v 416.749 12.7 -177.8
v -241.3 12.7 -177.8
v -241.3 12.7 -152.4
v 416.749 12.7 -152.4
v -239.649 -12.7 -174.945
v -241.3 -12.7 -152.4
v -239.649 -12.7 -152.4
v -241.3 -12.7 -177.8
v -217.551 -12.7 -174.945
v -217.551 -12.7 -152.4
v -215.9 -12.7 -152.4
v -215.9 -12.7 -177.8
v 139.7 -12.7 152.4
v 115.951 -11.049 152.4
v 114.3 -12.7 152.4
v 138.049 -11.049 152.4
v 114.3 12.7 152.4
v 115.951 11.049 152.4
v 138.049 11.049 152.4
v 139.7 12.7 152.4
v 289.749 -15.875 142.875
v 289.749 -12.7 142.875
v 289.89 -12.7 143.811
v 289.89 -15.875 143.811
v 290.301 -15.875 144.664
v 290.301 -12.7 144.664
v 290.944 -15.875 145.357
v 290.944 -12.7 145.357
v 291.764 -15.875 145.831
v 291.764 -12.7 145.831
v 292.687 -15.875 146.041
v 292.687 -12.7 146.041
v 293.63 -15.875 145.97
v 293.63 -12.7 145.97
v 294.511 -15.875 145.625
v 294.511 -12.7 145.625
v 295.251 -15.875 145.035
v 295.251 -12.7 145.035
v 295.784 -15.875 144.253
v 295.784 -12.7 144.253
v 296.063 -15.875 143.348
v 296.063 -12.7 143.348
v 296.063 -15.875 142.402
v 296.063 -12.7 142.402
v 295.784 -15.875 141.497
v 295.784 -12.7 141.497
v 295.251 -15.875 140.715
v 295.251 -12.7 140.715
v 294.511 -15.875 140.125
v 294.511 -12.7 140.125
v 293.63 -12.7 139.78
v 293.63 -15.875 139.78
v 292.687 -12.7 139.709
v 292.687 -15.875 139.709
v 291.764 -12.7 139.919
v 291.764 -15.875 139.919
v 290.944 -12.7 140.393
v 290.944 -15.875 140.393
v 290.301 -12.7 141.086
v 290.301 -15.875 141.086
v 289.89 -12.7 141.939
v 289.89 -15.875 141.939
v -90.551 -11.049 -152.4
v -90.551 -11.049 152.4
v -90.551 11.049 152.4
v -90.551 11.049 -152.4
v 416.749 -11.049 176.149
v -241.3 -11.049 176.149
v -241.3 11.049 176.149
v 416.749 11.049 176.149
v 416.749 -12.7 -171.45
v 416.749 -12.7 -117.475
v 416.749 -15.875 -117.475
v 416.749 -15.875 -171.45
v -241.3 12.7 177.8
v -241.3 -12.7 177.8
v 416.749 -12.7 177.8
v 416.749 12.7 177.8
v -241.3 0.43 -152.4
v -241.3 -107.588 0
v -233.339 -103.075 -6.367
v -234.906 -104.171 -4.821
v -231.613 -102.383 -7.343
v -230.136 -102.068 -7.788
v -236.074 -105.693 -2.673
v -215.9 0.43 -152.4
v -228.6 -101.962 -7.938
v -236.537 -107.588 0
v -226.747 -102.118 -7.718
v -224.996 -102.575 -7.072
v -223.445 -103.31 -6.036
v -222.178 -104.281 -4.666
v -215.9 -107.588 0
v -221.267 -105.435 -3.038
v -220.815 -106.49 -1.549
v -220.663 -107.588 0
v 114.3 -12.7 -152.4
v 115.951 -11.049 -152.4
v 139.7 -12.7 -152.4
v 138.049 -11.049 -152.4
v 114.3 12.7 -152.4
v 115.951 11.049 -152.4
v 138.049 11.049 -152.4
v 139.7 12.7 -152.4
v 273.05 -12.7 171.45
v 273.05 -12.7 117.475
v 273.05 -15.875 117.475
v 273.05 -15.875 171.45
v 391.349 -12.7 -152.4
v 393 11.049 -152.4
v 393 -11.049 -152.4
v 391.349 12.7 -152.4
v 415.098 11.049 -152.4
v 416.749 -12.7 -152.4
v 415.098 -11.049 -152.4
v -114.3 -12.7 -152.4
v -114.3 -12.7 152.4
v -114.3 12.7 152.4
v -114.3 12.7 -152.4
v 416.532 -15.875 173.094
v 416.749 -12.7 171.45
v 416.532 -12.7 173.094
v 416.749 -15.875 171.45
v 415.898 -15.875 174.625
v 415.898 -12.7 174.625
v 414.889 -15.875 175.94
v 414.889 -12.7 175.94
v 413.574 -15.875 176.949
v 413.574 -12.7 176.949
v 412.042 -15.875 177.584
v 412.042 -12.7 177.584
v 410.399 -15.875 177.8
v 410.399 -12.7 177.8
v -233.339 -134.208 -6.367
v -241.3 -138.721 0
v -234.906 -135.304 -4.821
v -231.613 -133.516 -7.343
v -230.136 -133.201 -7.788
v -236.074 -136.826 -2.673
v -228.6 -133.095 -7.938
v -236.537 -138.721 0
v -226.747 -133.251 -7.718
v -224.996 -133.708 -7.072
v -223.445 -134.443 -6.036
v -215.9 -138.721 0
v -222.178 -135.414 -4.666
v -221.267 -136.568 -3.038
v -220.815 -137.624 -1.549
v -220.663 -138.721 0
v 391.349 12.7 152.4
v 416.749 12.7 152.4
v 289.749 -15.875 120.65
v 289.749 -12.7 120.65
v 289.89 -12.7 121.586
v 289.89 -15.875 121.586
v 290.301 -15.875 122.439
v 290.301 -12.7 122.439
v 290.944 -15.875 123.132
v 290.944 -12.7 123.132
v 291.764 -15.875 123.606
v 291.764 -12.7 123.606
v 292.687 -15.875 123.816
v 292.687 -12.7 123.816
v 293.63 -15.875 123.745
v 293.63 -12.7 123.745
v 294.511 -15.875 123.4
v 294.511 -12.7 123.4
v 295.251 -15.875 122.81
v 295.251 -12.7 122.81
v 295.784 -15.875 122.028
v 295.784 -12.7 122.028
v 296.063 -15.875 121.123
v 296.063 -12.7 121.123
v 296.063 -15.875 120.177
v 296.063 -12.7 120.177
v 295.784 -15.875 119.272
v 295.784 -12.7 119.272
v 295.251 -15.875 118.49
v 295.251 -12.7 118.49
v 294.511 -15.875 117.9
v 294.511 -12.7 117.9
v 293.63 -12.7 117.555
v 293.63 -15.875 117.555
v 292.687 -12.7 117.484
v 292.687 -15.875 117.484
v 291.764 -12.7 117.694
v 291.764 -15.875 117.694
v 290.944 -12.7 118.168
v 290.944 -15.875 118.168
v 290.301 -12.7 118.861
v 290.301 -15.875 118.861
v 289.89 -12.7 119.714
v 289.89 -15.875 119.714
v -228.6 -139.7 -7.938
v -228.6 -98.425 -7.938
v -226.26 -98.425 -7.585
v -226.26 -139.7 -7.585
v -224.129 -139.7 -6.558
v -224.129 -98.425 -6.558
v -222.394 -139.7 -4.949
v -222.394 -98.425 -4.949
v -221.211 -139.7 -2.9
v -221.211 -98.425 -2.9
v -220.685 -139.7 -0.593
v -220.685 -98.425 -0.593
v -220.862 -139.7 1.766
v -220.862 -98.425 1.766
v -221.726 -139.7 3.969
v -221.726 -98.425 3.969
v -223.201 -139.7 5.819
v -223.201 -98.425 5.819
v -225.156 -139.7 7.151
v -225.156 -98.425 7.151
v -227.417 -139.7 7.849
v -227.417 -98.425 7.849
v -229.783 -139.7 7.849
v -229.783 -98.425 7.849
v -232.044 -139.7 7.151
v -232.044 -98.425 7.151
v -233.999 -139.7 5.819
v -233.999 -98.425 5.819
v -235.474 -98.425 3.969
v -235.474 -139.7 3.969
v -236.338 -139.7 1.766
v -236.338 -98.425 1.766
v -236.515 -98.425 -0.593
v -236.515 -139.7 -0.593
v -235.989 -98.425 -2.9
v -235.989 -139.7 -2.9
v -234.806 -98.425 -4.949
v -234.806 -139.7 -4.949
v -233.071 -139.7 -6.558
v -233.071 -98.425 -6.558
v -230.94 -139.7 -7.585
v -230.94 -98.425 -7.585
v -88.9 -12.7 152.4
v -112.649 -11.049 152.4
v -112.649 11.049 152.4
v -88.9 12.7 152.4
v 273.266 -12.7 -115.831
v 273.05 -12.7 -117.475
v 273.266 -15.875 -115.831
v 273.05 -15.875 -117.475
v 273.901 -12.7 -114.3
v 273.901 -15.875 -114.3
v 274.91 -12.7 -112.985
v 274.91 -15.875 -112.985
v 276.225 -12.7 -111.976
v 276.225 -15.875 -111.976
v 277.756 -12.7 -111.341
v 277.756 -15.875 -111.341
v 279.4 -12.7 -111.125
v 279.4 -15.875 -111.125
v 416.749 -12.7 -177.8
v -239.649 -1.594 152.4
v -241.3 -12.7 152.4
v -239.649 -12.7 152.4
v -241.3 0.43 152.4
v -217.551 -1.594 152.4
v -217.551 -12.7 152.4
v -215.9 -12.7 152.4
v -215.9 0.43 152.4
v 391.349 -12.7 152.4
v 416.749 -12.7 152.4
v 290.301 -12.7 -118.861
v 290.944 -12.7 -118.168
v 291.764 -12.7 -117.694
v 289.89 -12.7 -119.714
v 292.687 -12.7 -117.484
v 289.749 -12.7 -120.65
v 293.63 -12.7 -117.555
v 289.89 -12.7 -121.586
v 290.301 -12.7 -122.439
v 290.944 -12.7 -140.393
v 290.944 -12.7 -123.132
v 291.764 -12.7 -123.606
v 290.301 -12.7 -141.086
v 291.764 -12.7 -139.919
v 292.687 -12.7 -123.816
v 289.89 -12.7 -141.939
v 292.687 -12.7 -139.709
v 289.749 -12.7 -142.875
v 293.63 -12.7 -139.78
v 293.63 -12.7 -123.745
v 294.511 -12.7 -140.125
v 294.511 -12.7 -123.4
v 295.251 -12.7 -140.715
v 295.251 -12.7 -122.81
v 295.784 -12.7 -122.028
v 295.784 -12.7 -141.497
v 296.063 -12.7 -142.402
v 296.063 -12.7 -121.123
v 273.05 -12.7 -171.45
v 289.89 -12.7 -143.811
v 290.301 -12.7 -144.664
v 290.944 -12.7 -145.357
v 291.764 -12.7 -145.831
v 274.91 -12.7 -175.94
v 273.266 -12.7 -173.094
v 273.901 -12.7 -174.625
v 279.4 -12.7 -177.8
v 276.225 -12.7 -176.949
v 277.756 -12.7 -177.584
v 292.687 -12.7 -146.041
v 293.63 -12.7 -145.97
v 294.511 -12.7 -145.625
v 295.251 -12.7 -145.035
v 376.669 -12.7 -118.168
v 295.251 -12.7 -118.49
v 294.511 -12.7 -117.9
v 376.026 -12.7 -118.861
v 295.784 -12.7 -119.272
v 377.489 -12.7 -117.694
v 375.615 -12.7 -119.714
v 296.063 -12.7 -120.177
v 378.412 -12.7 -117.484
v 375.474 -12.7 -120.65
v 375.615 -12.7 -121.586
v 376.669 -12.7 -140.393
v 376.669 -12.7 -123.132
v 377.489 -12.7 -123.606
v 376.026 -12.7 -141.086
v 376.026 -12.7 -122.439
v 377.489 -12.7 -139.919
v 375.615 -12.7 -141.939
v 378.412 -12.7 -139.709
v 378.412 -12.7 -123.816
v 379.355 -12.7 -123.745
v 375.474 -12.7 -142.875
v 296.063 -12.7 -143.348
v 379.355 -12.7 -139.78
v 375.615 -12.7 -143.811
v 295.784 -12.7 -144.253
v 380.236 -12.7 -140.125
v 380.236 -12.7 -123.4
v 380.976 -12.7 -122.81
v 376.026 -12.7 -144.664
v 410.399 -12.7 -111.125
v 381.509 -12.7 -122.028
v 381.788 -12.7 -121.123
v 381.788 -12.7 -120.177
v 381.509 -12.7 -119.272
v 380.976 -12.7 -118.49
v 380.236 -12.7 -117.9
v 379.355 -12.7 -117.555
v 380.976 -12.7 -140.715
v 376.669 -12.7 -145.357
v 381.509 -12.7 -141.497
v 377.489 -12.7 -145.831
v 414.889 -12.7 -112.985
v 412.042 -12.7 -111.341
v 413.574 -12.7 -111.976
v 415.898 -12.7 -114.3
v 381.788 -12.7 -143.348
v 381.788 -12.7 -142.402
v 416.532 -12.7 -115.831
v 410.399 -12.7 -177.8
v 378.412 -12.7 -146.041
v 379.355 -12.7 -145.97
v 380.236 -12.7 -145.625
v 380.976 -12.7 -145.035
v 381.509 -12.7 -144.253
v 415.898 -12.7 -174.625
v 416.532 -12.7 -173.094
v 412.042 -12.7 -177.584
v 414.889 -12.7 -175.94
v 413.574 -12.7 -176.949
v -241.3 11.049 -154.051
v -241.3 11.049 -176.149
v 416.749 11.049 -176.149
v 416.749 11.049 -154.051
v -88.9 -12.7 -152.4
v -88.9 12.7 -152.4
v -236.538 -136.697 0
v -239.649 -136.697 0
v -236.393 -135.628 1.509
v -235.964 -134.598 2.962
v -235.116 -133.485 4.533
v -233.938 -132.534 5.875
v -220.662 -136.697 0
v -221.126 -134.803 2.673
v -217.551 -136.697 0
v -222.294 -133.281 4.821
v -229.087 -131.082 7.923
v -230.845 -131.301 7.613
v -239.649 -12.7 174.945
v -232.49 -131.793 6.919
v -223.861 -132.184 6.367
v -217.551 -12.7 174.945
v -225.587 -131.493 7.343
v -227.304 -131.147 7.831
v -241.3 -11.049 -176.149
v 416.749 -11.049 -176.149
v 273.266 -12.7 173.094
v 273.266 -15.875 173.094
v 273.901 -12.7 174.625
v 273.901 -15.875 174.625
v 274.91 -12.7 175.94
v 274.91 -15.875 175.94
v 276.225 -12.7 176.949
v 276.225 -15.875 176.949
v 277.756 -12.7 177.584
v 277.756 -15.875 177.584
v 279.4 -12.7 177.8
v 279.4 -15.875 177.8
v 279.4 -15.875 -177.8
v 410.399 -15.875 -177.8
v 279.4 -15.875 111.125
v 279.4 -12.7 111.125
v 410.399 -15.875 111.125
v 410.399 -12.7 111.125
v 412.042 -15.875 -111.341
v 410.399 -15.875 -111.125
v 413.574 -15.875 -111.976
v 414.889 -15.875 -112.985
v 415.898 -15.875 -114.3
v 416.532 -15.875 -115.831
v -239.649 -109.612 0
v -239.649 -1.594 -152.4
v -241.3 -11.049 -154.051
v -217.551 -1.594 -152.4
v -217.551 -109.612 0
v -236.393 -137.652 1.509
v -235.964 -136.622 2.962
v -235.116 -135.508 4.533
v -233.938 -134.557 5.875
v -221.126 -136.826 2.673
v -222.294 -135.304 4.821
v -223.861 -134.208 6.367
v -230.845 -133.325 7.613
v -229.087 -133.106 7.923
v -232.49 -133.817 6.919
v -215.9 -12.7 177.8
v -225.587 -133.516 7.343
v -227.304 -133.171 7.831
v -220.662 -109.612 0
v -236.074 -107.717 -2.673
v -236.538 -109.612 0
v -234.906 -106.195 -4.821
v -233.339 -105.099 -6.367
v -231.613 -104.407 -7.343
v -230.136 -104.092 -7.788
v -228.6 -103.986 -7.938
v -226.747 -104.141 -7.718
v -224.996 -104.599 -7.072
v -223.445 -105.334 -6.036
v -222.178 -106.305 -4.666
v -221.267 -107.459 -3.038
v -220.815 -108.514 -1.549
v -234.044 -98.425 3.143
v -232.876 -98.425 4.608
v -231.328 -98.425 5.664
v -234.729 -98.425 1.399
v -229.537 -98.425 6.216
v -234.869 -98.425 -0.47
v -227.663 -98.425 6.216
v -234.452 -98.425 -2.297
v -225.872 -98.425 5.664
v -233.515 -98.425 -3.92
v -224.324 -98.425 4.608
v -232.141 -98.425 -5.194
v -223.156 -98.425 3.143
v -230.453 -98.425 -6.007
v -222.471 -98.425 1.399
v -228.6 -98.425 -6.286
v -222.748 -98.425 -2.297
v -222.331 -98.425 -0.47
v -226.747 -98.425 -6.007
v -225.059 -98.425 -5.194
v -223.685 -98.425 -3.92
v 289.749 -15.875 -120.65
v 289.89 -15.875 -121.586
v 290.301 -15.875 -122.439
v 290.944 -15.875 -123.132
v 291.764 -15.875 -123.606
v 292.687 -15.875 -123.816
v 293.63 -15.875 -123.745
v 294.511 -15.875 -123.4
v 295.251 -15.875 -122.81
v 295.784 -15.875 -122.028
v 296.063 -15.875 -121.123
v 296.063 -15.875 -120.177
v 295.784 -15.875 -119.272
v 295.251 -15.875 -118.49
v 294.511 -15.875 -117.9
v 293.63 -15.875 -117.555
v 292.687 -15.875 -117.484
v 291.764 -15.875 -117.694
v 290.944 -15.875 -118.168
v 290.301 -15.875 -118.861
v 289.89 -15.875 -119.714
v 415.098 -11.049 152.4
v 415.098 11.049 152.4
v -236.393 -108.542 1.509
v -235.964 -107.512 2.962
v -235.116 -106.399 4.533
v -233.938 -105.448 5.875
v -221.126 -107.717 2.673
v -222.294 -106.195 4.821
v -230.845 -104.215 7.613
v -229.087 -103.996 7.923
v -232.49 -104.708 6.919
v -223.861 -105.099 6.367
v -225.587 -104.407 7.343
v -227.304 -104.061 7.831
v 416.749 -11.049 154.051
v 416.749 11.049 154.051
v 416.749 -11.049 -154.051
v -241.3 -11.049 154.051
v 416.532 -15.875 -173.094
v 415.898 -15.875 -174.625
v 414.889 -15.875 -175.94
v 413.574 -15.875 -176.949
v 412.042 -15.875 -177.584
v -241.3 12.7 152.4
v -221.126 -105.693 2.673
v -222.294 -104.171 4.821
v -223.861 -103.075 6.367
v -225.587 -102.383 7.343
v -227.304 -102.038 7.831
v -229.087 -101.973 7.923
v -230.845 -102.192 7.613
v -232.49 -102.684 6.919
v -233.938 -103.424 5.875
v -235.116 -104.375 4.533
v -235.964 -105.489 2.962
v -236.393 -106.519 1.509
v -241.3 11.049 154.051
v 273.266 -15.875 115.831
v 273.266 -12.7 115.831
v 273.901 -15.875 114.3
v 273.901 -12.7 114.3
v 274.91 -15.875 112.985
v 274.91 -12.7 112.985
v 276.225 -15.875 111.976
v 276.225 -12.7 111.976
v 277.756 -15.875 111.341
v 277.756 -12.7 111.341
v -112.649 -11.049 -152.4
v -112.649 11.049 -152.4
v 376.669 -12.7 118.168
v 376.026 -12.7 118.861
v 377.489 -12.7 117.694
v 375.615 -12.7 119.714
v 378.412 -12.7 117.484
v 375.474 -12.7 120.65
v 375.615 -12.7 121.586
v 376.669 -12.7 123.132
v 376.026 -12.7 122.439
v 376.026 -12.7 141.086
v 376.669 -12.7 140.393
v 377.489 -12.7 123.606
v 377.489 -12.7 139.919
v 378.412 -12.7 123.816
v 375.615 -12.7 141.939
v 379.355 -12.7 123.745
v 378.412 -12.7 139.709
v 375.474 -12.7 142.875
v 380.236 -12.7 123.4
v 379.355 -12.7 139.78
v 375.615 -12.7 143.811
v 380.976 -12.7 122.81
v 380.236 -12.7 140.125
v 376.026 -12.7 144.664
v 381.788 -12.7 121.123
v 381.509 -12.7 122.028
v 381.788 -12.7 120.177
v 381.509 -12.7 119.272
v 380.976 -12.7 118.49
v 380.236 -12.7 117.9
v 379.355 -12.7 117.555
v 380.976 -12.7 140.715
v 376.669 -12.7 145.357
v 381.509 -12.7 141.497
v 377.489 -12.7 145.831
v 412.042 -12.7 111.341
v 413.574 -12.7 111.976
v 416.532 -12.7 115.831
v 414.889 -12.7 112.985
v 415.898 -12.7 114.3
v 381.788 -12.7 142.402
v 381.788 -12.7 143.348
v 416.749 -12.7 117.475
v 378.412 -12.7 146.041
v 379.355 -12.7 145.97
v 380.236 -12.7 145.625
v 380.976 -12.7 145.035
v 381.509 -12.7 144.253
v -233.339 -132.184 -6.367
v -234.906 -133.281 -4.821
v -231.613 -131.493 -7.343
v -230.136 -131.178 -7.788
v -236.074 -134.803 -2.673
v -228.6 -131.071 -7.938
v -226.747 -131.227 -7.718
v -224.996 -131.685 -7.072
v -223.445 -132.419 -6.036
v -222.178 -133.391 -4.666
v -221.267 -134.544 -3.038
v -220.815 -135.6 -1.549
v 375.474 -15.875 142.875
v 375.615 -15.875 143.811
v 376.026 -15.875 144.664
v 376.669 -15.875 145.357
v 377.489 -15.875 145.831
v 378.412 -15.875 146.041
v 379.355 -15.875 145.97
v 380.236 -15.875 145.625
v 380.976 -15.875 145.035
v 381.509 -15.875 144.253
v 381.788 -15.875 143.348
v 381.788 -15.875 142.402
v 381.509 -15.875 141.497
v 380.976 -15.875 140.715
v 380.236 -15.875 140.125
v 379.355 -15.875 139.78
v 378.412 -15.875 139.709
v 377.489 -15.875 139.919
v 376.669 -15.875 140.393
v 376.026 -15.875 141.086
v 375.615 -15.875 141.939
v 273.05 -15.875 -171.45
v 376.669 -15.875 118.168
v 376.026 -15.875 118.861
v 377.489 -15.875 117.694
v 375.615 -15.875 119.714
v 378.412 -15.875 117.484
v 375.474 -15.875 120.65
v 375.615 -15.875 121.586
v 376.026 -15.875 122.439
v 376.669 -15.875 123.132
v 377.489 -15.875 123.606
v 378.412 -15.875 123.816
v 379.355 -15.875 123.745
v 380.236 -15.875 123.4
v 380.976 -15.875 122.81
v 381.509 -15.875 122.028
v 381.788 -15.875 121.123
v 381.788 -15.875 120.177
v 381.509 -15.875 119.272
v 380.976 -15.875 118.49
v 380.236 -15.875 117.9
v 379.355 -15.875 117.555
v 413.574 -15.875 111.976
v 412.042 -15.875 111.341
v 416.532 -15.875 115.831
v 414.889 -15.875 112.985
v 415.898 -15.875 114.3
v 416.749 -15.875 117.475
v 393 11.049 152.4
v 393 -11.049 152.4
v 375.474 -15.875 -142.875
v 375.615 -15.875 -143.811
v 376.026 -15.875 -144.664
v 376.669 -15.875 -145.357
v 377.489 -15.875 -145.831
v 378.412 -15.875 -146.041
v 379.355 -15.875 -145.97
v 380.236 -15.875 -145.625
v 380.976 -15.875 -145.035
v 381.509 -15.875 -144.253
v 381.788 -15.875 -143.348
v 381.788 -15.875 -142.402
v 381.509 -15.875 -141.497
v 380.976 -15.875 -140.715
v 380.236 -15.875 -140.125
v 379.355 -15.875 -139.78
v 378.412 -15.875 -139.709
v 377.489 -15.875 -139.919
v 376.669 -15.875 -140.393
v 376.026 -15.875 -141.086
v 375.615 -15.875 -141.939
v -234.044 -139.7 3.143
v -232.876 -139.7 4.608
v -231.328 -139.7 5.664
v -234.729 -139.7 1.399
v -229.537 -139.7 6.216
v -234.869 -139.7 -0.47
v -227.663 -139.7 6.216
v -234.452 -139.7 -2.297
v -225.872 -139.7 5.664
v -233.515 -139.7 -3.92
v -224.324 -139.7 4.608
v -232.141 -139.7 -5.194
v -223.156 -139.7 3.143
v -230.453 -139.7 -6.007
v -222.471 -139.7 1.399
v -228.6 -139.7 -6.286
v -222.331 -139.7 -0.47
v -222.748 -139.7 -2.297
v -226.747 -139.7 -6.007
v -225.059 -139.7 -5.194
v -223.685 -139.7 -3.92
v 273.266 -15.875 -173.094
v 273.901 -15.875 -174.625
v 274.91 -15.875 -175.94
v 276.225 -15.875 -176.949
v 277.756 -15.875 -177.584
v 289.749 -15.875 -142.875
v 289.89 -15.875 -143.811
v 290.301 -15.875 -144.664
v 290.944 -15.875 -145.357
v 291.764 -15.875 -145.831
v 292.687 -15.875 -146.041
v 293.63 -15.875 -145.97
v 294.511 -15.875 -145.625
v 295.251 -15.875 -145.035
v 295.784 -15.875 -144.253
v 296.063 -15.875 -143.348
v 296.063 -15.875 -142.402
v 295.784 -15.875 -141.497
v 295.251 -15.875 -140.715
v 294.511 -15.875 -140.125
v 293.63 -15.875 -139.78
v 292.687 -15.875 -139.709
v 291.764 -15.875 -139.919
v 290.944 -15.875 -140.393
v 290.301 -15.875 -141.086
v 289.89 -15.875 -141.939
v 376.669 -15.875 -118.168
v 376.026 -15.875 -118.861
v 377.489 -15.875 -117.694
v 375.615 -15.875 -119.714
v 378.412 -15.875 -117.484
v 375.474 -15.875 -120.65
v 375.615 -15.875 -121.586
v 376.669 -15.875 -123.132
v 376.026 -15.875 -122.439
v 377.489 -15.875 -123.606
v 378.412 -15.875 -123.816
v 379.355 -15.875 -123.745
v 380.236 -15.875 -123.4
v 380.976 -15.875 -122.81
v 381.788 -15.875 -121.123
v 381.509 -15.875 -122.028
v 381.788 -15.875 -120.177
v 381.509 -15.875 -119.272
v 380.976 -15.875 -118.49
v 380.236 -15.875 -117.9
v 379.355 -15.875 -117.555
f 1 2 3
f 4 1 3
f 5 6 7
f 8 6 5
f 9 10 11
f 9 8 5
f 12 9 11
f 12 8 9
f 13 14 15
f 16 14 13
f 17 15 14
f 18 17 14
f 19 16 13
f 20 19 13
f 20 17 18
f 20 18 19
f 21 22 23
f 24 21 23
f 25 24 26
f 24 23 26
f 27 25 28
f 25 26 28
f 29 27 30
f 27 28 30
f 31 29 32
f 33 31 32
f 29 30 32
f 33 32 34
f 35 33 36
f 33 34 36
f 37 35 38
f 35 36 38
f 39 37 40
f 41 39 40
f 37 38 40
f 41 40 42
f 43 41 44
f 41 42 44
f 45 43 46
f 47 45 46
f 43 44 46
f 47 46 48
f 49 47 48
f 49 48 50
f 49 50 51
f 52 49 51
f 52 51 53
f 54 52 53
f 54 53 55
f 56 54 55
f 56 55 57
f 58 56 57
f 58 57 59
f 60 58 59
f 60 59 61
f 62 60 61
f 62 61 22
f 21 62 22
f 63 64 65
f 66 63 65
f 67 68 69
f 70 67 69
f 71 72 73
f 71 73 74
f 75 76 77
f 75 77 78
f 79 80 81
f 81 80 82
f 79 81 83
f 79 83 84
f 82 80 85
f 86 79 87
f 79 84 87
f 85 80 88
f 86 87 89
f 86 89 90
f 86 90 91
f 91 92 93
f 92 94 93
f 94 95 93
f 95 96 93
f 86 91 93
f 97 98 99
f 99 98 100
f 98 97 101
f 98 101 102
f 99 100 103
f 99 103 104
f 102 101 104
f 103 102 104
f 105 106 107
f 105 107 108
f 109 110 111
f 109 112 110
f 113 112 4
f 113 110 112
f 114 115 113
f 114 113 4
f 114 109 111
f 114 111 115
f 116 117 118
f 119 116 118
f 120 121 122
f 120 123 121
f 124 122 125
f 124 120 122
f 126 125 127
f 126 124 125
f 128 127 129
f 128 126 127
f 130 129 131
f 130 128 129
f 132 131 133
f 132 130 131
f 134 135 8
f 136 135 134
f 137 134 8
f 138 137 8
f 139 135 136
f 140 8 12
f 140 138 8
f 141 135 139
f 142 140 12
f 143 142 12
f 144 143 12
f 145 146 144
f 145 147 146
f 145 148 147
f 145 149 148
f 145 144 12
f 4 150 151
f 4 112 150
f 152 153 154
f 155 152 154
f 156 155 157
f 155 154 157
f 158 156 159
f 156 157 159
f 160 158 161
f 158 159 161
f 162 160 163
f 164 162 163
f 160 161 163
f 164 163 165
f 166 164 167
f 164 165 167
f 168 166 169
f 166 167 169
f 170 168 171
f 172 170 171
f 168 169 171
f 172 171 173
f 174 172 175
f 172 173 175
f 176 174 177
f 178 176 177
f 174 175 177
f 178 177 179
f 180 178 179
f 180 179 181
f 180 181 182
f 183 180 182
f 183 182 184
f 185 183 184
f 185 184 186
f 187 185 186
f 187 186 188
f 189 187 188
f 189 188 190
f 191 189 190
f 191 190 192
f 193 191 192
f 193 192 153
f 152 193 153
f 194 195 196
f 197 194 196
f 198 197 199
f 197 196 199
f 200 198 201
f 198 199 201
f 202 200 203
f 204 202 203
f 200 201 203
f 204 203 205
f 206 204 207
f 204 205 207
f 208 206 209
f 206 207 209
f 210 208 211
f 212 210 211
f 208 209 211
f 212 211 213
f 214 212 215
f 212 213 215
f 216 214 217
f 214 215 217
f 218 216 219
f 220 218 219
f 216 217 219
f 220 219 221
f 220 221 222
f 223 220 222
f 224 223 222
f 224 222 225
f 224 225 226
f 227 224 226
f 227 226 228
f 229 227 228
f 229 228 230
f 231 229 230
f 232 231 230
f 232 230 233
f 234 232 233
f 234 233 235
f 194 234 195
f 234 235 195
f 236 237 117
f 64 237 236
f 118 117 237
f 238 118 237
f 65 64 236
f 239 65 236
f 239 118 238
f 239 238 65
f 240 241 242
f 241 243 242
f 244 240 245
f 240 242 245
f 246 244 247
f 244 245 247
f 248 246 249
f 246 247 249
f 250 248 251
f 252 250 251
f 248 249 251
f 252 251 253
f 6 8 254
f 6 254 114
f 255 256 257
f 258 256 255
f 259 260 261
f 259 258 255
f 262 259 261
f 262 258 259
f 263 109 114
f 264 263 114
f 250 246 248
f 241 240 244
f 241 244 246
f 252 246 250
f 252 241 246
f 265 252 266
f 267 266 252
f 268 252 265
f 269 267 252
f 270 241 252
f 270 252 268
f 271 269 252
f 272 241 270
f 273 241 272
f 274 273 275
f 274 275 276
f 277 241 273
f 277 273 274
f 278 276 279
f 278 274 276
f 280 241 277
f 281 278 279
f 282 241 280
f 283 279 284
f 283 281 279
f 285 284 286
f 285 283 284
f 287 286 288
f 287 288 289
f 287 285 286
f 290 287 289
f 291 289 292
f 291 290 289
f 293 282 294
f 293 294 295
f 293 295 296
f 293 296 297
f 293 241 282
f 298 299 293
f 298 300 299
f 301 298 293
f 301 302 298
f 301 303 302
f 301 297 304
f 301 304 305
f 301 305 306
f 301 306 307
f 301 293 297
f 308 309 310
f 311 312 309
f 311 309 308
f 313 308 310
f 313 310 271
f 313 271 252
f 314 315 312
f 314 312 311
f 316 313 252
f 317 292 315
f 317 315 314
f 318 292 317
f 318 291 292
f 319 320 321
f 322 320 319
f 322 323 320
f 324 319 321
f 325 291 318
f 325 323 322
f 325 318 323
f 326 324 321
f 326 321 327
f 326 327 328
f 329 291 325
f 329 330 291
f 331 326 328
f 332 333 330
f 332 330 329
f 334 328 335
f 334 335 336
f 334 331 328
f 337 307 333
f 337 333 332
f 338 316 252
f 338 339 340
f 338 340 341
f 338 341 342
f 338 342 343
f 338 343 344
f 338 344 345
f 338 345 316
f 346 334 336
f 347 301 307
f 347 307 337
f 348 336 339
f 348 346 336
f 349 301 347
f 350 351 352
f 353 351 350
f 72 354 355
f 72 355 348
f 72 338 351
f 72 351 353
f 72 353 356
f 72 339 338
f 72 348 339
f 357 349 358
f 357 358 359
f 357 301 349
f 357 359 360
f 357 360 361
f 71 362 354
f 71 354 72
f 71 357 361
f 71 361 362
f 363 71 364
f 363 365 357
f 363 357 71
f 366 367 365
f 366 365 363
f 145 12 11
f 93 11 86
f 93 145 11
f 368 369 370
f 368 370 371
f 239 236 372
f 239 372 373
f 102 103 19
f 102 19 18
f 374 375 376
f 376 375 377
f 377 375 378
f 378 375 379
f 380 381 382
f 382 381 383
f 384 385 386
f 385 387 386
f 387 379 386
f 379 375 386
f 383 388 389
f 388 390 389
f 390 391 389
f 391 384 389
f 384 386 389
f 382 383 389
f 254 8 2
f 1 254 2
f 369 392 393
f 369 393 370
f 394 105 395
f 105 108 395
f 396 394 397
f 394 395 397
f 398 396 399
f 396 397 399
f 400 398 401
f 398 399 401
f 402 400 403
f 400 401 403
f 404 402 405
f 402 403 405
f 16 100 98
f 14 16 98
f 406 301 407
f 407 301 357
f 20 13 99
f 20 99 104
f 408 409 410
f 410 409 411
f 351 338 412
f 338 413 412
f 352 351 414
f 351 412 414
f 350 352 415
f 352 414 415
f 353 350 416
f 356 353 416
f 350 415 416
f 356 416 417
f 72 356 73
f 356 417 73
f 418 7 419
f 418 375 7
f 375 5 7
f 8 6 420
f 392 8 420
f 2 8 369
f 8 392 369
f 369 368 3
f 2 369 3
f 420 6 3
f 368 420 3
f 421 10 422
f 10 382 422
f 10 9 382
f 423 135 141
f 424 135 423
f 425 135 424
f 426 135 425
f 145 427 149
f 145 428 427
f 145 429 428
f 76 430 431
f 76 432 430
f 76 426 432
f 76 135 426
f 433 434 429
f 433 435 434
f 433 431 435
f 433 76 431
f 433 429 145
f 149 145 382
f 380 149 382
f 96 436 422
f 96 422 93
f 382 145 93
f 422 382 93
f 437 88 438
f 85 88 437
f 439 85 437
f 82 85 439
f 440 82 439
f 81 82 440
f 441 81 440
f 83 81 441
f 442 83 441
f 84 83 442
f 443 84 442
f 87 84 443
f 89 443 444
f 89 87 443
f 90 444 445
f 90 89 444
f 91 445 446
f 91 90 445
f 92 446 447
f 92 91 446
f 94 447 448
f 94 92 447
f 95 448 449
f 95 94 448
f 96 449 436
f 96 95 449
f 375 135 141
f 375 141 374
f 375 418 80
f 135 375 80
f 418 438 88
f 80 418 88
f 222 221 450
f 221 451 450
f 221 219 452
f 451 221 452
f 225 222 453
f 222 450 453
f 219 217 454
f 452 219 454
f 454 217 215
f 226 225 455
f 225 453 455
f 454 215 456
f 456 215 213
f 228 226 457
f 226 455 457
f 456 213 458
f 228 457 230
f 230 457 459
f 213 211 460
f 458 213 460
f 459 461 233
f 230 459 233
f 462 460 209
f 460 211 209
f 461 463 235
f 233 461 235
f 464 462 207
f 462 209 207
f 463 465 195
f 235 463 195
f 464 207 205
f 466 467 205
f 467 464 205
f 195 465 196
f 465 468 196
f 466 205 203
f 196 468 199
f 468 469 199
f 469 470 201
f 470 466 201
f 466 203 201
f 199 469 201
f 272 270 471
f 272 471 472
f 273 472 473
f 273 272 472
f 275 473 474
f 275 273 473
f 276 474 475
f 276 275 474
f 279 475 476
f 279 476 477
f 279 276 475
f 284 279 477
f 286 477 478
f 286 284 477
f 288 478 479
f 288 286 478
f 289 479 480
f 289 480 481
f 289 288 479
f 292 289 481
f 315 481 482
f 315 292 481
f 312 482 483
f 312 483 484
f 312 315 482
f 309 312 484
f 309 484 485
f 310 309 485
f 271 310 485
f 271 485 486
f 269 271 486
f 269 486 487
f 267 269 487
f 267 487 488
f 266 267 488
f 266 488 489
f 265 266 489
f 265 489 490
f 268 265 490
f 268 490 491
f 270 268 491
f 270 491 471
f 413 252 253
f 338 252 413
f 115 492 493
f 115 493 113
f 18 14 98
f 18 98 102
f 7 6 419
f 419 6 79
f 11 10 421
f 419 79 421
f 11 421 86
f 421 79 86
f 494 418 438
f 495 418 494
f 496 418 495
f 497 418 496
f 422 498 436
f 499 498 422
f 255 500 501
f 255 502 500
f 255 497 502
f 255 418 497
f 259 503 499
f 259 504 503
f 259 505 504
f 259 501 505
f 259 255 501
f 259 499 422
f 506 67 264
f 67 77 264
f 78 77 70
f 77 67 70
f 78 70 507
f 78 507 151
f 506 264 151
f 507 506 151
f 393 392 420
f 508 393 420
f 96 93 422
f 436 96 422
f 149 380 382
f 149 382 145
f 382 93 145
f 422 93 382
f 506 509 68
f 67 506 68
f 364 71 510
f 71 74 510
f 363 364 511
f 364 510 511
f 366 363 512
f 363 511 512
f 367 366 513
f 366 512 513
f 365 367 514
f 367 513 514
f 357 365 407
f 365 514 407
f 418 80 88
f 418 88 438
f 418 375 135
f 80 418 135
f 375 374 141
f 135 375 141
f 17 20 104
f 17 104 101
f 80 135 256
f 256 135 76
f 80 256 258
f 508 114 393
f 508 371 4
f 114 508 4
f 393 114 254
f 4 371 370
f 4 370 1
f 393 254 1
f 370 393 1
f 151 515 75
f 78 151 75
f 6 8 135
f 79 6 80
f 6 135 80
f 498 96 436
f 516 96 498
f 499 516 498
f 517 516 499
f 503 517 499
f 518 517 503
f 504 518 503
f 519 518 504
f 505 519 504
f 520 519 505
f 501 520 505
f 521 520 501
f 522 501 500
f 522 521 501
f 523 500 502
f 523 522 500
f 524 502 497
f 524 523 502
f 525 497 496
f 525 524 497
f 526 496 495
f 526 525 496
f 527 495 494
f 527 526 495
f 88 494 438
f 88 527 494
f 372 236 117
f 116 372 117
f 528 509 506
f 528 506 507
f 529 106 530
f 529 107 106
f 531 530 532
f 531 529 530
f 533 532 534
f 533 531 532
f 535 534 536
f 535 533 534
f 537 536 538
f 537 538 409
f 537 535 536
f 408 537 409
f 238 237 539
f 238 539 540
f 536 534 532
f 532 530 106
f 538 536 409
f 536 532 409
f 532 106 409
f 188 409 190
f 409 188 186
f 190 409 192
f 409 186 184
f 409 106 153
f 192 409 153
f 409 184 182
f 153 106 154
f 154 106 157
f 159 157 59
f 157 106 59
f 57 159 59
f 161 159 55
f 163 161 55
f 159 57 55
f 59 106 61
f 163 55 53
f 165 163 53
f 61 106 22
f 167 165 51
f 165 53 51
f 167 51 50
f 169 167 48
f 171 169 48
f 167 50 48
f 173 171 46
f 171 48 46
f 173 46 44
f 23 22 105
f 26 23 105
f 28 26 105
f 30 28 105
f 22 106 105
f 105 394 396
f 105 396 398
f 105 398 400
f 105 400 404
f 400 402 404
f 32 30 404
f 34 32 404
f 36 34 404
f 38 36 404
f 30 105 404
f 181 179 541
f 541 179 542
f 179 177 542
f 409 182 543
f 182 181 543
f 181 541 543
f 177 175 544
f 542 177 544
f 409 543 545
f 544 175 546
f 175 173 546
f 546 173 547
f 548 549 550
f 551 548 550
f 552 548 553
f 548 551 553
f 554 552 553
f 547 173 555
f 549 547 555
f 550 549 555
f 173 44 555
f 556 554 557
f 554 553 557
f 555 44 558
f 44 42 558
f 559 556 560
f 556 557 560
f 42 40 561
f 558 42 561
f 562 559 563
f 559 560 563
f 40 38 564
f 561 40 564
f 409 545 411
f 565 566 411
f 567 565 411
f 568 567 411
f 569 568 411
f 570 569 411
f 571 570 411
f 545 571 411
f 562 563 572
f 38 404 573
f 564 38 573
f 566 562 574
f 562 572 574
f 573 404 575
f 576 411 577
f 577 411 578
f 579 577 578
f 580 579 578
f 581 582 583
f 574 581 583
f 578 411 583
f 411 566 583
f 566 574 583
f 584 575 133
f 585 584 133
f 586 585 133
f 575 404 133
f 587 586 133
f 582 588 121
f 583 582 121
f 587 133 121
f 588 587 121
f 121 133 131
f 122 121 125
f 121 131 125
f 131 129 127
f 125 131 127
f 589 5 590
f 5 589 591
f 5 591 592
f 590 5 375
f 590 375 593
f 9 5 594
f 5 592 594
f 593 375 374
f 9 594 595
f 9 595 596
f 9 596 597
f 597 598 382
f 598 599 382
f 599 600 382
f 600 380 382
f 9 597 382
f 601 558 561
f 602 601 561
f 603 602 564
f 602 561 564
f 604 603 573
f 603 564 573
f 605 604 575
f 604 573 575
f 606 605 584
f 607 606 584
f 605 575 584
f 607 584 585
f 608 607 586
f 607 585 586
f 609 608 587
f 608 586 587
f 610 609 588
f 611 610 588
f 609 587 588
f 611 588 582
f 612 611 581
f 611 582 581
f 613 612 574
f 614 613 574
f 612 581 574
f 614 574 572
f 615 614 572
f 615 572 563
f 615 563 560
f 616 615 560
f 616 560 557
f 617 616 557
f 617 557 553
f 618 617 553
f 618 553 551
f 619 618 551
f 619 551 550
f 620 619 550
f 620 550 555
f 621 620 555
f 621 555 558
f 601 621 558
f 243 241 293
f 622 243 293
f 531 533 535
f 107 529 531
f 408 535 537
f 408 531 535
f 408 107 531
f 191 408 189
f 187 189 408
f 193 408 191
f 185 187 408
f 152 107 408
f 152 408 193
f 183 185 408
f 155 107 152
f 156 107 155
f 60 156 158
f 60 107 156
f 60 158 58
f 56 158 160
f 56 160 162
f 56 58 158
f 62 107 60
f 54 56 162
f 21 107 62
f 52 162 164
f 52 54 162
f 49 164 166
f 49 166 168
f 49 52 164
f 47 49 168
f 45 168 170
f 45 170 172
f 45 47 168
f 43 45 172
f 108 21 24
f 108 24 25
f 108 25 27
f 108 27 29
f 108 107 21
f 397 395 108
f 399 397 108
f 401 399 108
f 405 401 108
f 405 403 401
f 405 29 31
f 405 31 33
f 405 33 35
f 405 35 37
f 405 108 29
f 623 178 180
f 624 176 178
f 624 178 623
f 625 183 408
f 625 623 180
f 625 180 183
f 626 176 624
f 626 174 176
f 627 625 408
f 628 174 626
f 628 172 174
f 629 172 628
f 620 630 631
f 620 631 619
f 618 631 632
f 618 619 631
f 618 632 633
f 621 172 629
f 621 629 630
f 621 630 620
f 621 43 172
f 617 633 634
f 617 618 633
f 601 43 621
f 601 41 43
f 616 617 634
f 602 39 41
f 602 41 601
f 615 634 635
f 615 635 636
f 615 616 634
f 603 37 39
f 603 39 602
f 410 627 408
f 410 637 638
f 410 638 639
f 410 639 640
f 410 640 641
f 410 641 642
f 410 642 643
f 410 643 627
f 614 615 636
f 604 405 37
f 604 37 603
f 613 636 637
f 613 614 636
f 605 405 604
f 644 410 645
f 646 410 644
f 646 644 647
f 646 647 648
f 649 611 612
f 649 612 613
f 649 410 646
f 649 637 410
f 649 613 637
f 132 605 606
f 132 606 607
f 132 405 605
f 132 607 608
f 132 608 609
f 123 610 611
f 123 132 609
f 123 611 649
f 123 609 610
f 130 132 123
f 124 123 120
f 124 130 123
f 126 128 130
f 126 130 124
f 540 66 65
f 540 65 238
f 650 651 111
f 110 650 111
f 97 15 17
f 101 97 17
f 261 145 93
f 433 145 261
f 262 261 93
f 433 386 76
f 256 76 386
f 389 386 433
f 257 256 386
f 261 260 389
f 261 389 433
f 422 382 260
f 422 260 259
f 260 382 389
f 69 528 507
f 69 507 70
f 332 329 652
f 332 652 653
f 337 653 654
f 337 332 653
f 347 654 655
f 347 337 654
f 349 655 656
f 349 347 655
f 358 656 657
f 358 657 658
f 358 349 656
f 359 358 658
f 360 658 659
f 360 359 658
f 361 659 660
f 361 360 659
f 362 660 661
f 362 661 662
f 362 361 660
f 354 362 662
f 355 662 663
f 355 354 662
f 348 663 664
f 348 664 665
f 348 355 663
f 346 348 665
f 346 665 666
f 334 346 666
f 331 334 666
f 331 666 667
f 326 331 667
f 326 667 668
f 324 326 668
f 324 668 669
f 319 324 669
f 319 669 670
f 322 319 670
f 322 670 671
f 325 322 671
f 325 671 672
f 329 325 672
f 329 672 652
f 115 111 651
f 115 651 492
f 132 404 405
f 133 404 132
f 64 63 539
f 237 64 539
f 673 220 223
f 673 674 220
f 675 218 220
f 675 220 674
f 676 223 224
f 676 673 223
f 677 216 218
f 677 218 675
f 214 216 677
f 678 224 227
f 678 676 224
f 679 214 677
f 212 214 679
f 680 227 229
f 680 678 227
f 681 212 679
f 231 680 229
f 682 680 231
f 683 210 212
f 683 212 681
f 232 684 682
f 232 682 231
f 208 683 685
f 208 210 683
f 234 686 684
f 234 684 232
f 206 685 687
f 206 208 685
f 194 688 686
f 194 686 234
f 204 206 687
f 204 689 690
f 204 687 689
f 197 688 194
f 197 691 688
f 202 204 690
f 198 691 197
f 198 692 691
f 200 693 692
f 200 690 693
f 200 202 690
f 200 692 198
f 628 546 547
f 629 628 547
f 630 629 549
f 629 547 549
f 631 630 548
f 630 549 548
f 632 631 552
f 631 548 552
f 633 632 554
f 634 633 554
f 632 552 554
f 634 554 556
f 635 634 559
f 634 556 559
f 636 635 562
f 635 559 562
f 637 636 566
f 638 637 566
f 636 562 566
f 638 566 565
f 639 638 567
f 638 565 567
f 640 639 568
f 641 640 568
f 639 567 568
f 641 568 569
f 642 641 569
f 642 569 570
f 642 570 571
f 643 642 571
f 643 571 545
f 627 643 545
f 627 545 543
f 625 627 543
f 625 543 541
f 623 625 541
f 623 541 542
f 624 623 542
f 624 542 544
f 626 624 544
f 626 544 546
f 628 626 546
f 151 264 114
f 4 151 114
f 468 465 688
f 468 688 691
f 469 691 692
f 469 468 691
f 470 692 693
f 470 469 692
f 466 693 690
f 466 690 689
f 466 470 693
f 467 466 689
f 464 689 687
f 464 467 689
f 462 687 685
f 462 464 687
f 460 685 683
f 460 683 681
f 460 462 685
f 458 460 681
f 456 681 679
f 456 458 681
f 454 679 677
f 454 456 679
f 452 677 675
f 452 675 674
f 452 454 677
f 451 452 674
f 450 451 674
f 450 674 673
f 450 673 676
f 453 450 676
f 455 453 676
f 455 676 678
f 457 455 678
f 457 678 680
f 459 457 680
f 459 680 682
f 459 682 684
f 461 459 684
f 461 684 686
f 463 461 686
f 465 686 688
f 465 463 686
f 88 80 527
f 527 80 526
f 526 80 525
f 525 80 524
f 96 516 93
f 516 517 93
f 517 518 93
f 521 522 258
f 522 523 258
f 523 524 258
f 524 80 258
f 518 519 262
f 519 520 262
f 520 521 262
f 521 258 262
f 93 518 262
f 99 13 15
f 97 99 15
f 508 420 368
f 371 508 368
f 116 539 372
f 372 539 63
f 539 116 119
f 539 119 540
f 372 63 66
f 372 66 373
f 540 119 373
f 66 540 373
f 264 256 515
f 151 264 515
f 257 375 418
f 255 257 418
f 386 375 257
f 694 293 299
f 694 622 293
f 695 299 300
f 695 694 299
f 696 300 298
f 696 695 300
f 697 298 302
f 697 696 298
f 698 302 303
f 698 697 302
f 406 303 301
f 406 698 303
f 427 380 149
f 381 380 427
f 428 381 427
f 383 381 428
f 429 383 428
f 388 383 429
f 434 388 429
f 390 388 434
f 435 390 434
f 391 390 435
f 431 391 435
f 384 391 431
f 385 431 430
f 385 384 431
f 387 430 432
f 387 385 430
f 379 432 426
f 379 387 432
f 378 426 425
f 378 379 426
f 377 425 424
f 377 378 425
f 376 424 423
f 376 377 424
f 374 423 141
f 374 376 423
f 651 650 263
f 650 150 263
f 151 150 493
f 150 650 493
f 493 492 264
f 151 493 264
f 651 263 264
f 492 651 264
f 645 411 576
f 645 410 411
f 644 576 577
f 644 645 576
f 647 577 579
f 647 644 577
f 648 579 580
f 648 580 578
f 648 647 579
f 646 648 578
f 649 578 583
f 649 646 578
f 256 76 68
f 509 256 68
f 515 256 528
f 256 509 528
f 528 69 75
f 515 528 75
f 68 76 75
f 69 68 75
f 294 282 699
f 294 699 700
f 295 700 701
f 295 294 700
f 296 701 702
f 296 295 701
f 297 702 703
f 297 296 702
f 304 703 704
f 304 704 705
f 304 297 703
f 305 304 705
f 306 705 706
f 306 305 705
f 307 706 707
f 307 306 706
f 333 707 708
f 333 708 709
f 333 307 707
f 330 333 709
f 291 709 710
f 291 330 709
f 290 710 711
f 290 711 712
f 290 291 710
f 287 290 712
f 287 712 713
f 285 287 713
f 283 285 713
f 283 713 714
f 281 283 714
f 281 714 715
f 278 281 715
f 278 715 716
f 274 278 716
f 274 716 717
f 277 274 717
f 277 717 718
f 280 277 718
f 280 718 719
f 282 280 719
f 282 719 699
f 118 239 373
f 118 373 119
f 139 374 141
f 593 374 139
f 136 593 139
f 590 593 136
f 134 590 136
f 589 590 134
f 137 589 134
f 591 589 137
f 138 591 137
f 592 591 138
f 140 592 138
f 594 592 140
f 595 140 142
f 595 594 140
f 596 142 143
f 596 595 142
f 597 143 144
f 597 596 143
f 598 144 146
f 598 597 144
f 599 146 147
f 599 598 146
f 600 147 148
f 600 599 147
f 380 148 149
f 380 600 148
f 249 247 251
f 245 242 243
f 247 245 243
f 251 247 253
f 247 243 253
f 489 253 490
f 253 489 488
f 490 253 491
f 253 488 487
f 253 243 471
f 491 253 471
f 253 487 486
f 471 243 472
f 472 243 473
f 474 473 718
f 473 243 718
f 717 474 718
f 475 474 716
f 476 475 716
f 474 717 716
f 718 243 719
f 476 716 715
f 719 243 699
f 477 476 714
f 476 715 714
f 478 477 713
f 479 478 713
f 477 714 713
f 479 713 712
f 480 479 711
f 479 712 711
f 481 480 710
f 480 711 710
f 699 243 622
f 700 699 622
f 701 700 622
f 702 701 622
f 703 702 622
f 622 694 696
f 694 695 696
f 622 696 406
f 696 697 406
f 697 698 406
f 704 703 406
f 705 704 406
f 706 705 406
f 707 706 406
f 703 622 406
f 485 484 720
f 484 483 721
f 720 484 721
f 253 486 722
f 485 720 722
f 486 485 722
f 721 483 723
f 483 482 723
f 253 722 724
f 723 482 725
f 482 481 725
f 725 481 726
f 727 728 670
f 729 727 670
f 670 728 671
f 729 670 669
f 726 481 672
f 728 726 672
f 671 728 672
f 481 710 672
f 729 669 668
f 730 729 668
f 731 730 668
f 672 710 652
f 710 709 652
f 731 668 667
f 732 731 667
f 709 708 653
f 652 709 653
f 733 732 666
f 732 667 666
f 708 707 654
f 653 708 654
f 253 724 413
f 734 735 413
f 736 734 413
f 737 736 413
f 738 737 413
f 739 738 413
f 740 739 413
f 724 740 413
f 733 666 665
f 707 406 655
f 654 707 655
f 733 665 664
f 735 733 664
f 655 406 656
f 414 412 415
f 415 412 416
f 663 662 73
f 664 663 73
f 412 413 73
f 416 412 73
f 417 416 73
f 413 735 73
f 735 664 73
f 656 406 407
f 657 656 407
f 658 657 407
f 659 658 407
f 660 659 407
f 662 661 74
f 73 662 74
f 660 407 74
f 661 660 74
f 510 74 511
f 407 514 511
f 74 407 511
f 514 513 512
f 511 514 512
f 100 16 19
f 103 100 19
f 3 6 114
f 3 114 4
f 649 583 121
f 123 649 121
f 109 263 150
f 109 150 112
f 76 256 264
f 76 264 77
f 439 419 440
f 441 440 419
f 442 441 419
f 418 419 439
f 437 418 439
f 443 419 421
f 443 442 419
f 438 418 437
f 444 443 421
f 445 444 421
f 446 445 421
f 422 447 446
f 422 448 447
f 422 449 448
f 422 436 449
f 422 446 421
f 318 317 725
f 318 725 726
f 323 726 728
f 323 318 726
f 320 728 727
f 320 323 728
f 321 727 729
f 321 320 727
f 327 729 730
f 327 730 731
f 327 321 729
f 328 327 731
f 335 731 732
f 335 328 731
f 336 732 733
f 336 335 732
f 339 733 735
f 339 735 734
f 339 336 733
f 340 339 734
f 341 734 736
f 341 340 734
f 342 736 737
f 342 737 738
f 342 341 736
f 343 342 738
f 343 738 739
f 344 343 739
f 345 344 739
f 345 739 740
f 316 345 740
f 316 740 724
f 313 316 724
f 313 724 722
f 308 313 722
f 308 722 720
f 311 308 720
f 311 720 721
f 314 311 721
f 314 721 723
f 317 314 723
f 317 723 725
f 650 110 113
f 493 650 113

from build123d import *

# Parameters (mm, degrees)
BED_START                  = -12.7
BED_MEMBERS_OUTLINE_W      = 1.651
BED_MEMBERS_OUTLINE_H      = 304.8
BED_MEMBERS_DEPTH          = 25.4
BED_MEMBERS_2_OUTLINE_W    = 22.098
BED_MEMBERS_2_OUTLINE_H    = 304.8
BED_MEMBERS_2_DEPTH        = 1.651
BED_START_2                = 11.049
BED_MEMBERS_3_OUTLINE_W    = 22.098
BED_MEMBERS_3_OUTLINE_H    = 304.8
BED_MEMBERS_3_DEPTH        = 1.651
BED_START_3                = 152.4
BED_MEMBERS_4_OUTLINE_W    = 645.34884646
BED_MEMBERS_4_OUTLINE_H    = 1.651
BED_MEMBERS_4_DEPTH        = 25.4
BED_MEMBERS_5_OUTLINE_W    = 645.34884646
BED_MEMBERS_5_OUTLINE_H    = 22.098
BED_MEMBERS_5_DEPTH        = 1.651
BED_START_4                = 176.149
BED_MEMBERS_6_OUTLINE_W    = 645.34884646
BED_MEMBERS_6_OUTLINE_H    = 22.098
BED_MEMBERS_6_DEPTH        = 1.651
BED_START_5                = -177.8
BED_MEMBERS_7_OUTLINE_W    = 645.34884646
BED_MEMBERS_7_OUTLINE_H    = 1.651
BED_MEMBERS_7_DEPTH        = 25.4
BED_MEMBERS_8_OUTLINE_W    = 645.34884646
BED_MEMBERS_8_OUTLINE_H    = 22.098
BED_MEMBERS_8_DEPTH        = 1.651
BED_START_6                = -154.051
BED_MEMBERS_9_OUTLINE_W    = 645.34884646
BED_MEMBERS_9_OUTLINE_H    = 22.098
BED_MEMBERS_9_DEPTH        = 1.651
SKETCH1_W                  = 25.4
SKETCH1_H                  = 25.4
SKETCH1_W_2                = 22.098
SKETCH1_H_2                = 22.098
BED_CROSSMEMBERS_DEPTH     = 330.2
SKETCH1_ON_SEGMENT_2_W     = 25.4
SKETCH1_ON_SEGMENT_2_H     = 25.4
SKETCH1_ON_SEGMENT_2_W_2   = 22.098
SKETCH1_ON_SEGMENT_2_H_2   = 22.098
BED_CROSSMEMBERS_2_DEPTH   = 330.2
SKETCH132_W                = 25.4
SKETCH132_H                = 25.4
SKETCH132_W_2              = 22.098
SKETCH132_H_2              = 22.098
REAR_LEG_MEMBERS_DEPTH     = 240.663092099
SKETCH132_ON_SEGMENT_2_W   = 25.4
SKETCH132_ON_SEGMENT_2_H   = 25.4
SKETCH132_ON_SEGMENT_2_W_2 = 22.098
SKETCH132_ON_SEGMENT_2_H_2 = 22.098
REAR_LEG_MEMBERS_2_DEPTH   = 240.663092099
SKETCH133_W                = 143.69884646
SKETCH133_H                = 66.675
FRONT_LEG_PLATE_DEPTH      = 3.175
FRONT_LEG_PLATE_FILLET_R   = 6.35
SKETCH136_R                = 3.175
FRONT_LEG_BOLT_HOLES_DEPTH = 471.291138189
TRIM_EXTEND1_START         = -165.1
TRIM_EXTEND1_OUTLINE_W     = 25.4
TRIM_EXTEND1_OUTLINE_H     = 25.4
TRIM_EXTEND1_OUTLINE_W_2   = 22.098
TRIM_EXTEND1_OUTLINE_H_2   = 22.098
TRIM_EXTEND1_DEPTH         = 12.7
TRIM_EXTEND1_START_2       = 152.4
TRIM_EXTEND1_2_OUTLINE_W   = 25.4
TRIM_EXTEND1_2_OUTLINE_H   = 25.4
TRIM_EXTEND1_2_OUTLINE_W_2 = 22.098
TRIM_EXTEND1_2_OUTLINE_H_2 = 22.098
TRIM_EXTEND1_2_DEPTH       = 12.7
TRIM_EXTEND1_3_OUTLINE_W   = 25.4
TRIM_EXTEND1_3_OUTLINE_H   = 25.4
TRIM_EXTEND1_3_OUTLINE_W_2 = 22.098
TRIM_EXTEND1_3_OUTLINE_H_2 = 22.098
TRIM_EXTEND1_3_DEPTH       = 12.7
TRIM_EXTEND1_4_OUTLINE_W   = 25.4
TRIM_EXTEND1_4_OUTLINE_H   = 25.4
TRIM_EXTEND1_4_OUTLINE_W_2 = 22.098
TRIM_EXTEND1_4_OUTLINE_H_2 = 22.098
TRIM_EXTEND1_4_DEPTH       = 12.7
TRIM_EXTEND1_START_3       = -177.8
TRIM_EXTEND1_5_OUTLINE_W   = 25.4
TRIM_EXTEND1_5_OUTLINE_H   = 22.7
TRIM_EXTEND1_5_DEPTH       = 25.4
TRIM_EXTEND1_6_OUTLINE_W   = 25.4
TRIM_EXTEND1_6_OUTLINE_H   = 22.7
TRIM_EXTEND1_6_DEPTH       = 25.4
SKETCH139_R                = 7.9375
SKETCH139_R_2              = 6.2865
CASTER_PIVOT_TUBE_DEPTH    = 41.275
TRIM_EXTEND4_START         = -241.3
TRIM_EXTEND4_OUTLINE_W     = 25.4
TRIM_EXTEND4_OUTLINE_H     = 25.4
TRIM_EXTEND4_OUTLINE_W_2   = 22.098
TRIM_EXTEND4_OUTLINE_H_2   = 22.098
TRIM_EXTEND4_DEPTH         = 12.7


# Read off the part's stored shape, not the designer's step: Bed members, Trim/Extend1, Trim/Extend4
with BuildPart() as part:
    # Bed members outline → Bed members (new body)
    with BuildSketch(Plane(origin=(0, 0, 0), x_dir=(1, 0, 0), z_dir=(0, 1, 0)).offset(BED_START)):
        with Locations((415.92334646, 0)):
            Rectangle(BED_MEMBERS_OUTLINE_W, BED_MEMBERS_OUTLINE_H)
        with Locations((392.17434646, 0)):
            Rectangle(BED_MEMBERS_OUTLINE_W, BED_MEMBERS_OUTLINE_H)
    extrude(amount=BED_MEMBERS_DEPTH)

    # Bed members 2 outline → Bed members 2 (add)
    with BuildSketch(Plane(origin=(0, 0, 0), x_dir=(1, 0, 0), z_dir=(0, 1, 0)).offset(BED_START)):
        with Locations((404.04884646, 0)):
            Rectangle(BED_MEMBERS_2_OUTLINE_W, BED_MEMBERS_2_OUTLINE_H)
    extrude(amount=BED_MEMBERS_2_DEPTH)

    # Bed members 3 outline → Bed members 3 (add)
    with BuildSketch(Plane(origin=(0, 0, 0), x_dir=(1, 0, 0), z_dir=(0, 1, 0)).offset(BED_START_2)):
        with Locations((404.04884646, 0)):
            Rectangle(BED_MEMBERS_3_OUTLINE_W, BED_MEMBERS_3_OUTLINE_H)
    extrude(amount=BED_MEMBERS_3_DEPTH)


with BuildPart() as body_2:
    # Bed members 4 outline → Bed members 4 (new body)
    with BuildSketch(Plane.XY.offset(BED_START_3)):
        with Locations((94.07442323, 11.8745)):
            Rectangle(BED_MEMBERS_4_OUTLINE_W, BED_MEMBERS_4_OUTLINE_H)
        with Locations((94.07442323, -11.8745)):
            Rectangle(BED_MEMBERS_4_OUTLINE_W, BED_MEMBERS_4_OUTLINE_H)
    extrude(amount=BED_MEMBERS_4_DEPTH)

    # Bed members 5 outline → Bed members 5 (add)
    with BuildSketch(Plane.XY.offset(BED_START_3)):
        with Locations((94.07442323, 0)):
            Rectangle(BED_MEMBERS_5_OUTLINE_W, BED_MEMBERS_5_OUTLINE_H)
    extrude(amount=BED_MEMBERS_5_DEPTH)

    # Bed members 6 outline → Bed members 6 (add)
    with BuildSketch(Plane.XY.offset(BED_START_4)):
        with Locations((94.07442323, 0)):
            Rectangle(BED_MEMBERS_6_OUTLINE_W, BED_MEMBERS_6_OUTLINE_H)
    extrude(amount=BED_MEMBERS_6_DEPTH)



with BuildPart() as body_3:
    # Bed members 7 outline → Bed members 7 (new body)
    with BuildSketch(Plane.XY.offset(BED_START_5)):
        with Locations((94.07442323, 11.8745)):
            Rectangle(BED_MEMBERS_7_OUTLINE_W, BED_MEMBERS_7_OUTLINE_H)
        with Locations((94.07442323, -11.8745)):
            Rectangle(BED_MEMBERS_7_OUTLINE_W, BED_MEMBERS_7_OUTLINE_H)
    extrude(amount=BED_MEMBERS_7_DEPTH)

    # Bed members 8 outline → Bed members 8 (add)
    with BuildSketch(Plane.XY.offset(BED_START_5)):
        with Locations((94.07442323, 0)):
            Rectangle(BED_MEMBERS_8_OUTLINE_W, BED_MEMBERS_8_OUTLINE_H)
    extrude(amount=BED_MEMBERS_8_DEPTH)

    # Bed members 9 outline → Bed members 9 (add)
    with BuildSketch(Plane.XY.offset(BED_START_6)):
        with Locations((94.07442323, 0)):
            Rectangle(BED_MEMBERS_9_OUTLINE_W, BED_MEMBERS_9_OUTLINE_H)
    extrude(amount=BED_MEMBERS_9_DEPTH)


with BuildPart() as body_4:
    # Sketch1 → Bed crossmembers (new body)
    with BuildSketch(Plane(origin=(127, 0, 165.1), x_dir=(-1, 0, 0), z_dir=(0, 0, -1))):
        Rectangle(SKETCH1_W, SKETCH1_H)
        Rectangle(SKETCH1_W_2, SKETCH1_H_2, mode=Mode.SUBTRACT)
    extrude(amount=BED_CROSSMEMBERS_DEPTH)

    # Trim/Extend1 outline → Trim/Extend1 (cut)
    with BuildSketch(Plane.XY.offset(TRIM_EXTEND1_START)):
        with Locations((127, 0)):
            Rectangle(TRIM_EXTEND1_OUTLINE_W, TRIM_EXTEND1_OUTLINE_H)
        with Locations((127, 0)):
            Rectangle(TRIM_EXTEND1_OUTLINE_W_2, TRIM_EXTEND1_OUTLINE_H_2, mode=Mode.SUBTRACT)
    extrude(amount=TRIM_EXTEND1_DEPTH, mode=Mode.SUBTRACT)

    # Trim_Extend1 2 outline → Trim_Extend1 2 (cut)
    with BuildSketch(Plane.XY.offset(TRIM_EXTEND1_START_2)):
        with Locations((127, 0)):
            Rectangle(TRIM_EXTEND1_2_OUTLINE_W, TRIM_EXTEND1_2_OUTLINE_H)
        with Locations((127, 0)):
            Rectangle(TRIM_EXTEND1_2_OUTLINE_W_2, TRIM_EXTEND1_2_OUTLINE_H_2, mode=Mode.SUBTRACT)
    extrude(amount=TRIM_EXTEND1_2_DEPTH, mode=Mode.SUBTRACT)


with BuildPart() as body_5:
    # Sketch1 on segment 2 (carried to segment 2) → Bed crossmembers 2 (new body)
    with BuildSketch(Plane(origin=(-101.6, 0, 165.1), x_dir=(-1, 0, 0), z_dir=(0, 0, -1))):
        Rectangle(SKETCH1_ON_SEGMENT_2_W, SKETCH1_ON_SEGMENT_2_H)
        Rectangle(SKETCH1_ON_SEGMENT_2_W_2, SKETCH1_ON_SEGMENT_2_H_2, mode=Mode.SUBTRACT)
    extrude(amount=BED_CROSSMEMBERS_2_DEPTH)

    # Trim_Extend1 3 outline → Trim_Extend1 3 (cut)
    with BuildSketch(Plane.XY.offset(TRIM_EXTEND1_START)):
        with Locations((-101.6, 0)):
            Rectangle(TRIM_EXTEND1_3_OUTLINE_W, TRIM_EXTEND1_3_OUTLINE_H)
        with Locations((-101.6, 0)):
            Rectangle(TRIM_EXTEND1_3_OUTLINE_W_2, TRIM_EXTEND1_3_OUTLINE_H_2, mode=Mode.SUBTRACT)
    extrude(amount=TRIM_EXTEND1_3_DEPTH, mode=Mode.SUBTRACT)

    # Trim_Extend1 4 outline → Trim_Extend1 4 (cut)
    with BuildSketch(Plane.XY.offset(TRIM_EXTEND1_START_2)):
        with Locations((-101.6, 0)):
            Rectangle(TRIM_EXTEND1_4_OUTLINE_W, TRIM_EXTEND1_4_OUTLINE_H)
        with Locations((-101.6, 0)):
            Rectangle(TRIM_EXTEND1_4_OUTLINE_W_2, TRIM_EXTEND1_4_OUTLINE_H_2, mode=Mode.SUBTRACT)
    extrude(amount=TRIM_EXTEND1_4_DEPTH, mode=Mode.SUBTRACT)


with BuildPart() as body_6:
    # Sketch132 → Rear leg members (new body)
    with BuildSketch(Plane(origin=(-228.6, -2.338672494, 170.45609829), x_dir=(0, 0.8158525595063999, -0.5782599771269463), z_dir=(0, -0.5782599771269463, -0.8158525595063999))):
        Rectangle(SKETCH132_W, SKETCH132_H)
        Rectangle(SKETCH132_W_2, SKETCH132_H_2, mode=Mode.SUBTRACT)
    extrude(amount=REAR_LEG_MEMBERS_DEPTH)

    # Rear leg members mitre 1
    split(bisect_by=Plane(origin=(-228.6, -138.721084, 0), x_dir=(0, -1, 0), z_dir=(0, 0, 1)), keep=Keep.TOP)

    # Trim_Extend1 6 outline → Trim_Extend1 6 (cut)
    with BuildSketch(Plane.XY.offset(TRIM_EXTEND1_START_2)):
        with Locations((-228.6, -1.35)):
            Rectangle(TRIM_EXTEND1_6_OUTLINE_W, TRIM_EXTEND1_6_OUTLINE_H)
    extrude(amount=TRIM_EXTEND1_6_DEPTH, mode=Mode.SUBTRACT)


with BuildPart() as body_7:
    # Sketch132 on segment 2 (carried to segment 2) → Rear leg members 2 (new body)
    with BuildSketch(Plane(origin=(-228.6, -141.504506626, 25.889501377), x_dir=(0, 0.81585256, 0.578259977), z_dir=(0, 0.578259977, -0.81585256))):
        Rectangle(SKETCH132_ON_SEGMENT_2_W, SKETCH132_ON_SEGMENT_2_H)
        Rectangle(SKETCH132_ON_SEGMENT_2_W_2, SKETCH132_ON_SEGMENT_2_H_2, mode=Mode.SUBTRACT)
    extrude(amount=REAR_LEG_MEMBERS_2_DEPTH)

    # Rear leg members 2 mitre 1
    split(bisect_by=Plane(origin=(-228.6, -138.721084, 0), x_dir=(0, 1, 0), z_dir=(0, 0, -1)), keep=Keep.TOP)

    # Trim_Extend1 5 outline → Trim_Extend1 5 (cut)
    with BuildSketch(Plane.XY.offset(TRIM_EXTEND1_START_3)):
        with Locations((-228.6, -1.35)):
            Rectangle(TRIM_EXTEND1_5_OUTLINE_W, TRIM_EXTEND1_5_OUTLINE_H)
    extrude(amount=TRIM_EXTEND1_5_DEPTH, mode=Mode.SUBTRACT)


with BuildPart() as body_8:
    # Sketch133 → Front leg plate (new body)
    with BuildSketch(Plane.XZ.offset(12.7)):
        with Locations((344.89942323, 144.4625)):
            Rectangle(SKETCH133_W, SKETCH133_H)
    extrude(amount=FRONT_LEG_PLATE_DEPTH)

    # Front leg plate fillet
    front_leg_plate_fillet_edges = [body_8.edges().sort_by_distance(p)[0] for p in [
        (273.05, -14.2875, 111.125),
        (273.05, -14.2875, 177.8),
        (416.74884646, -14.2875, 177.8),
        (416.74884646, -14.2875, 111.125),
    ]]
    fillet(front_leg_plate_fillet_edges, radius=FRONT_LEG_PLATE_FILLET_R)

    # Sketch136 → Front leg bolt holes (cut, through all)
    with BuildSketch(Plane(origin=(0, -12.7, 0), x_dir=(1, 0, 0), z_dir=(0, 1, 0))):
        with Locations(Location((292.92384646, -120.65, 0), (0, 0, 180))):
            Circle(SKETCH136_R)
        with Locations(Location((292.92384646, -142.875, 0), (0, 0, 180))):
            Circle(SKETCH136_R)
        with Locations(Location((378.64884646, -142.875, 0), (0, 0, 180))):
            Circle(SKETCH136_R)
        with Locations(Location((378.64884646, -120.65, 0), (0, 0, 180))):
            Circle(SKETCH136_R)
    extrude(amount=-FRONT_LEG_BOLT_HOLES_DEPTH, mode=Mode.SUBTRACT)


with BuildPart() as body_9:
    # Front leg plate mirror: mirrored copy
    add(body_8.part.mirror(Plane.XY))


with BuildPart() as body_10:
    # Sketch139 → Caster pivot tube (new body)
    with BuildSketch(Plane(origin=(-228.6, -98.425, 0), x_dir=(0, 0, -1), z_dir=(0, -1, 0))):
        Circle(SKETCH139_R)
        Circle(SKETCH139_R_2, mode=Mode.SUBTRACT)
    extrude(amount=CASTER_PIVOT_TUBE_DEPTH)


with BuildPart() as body_2_1:
    add(body_2.part)

    add(body_3.part)  # Trim/Extend4 merges body 3
    # Trim/Extend4 outline → Trim/Extend4 (add)
    # profile 1 of 2: a face of its own
    with BuildSketch(Plane.YZ.offset(TRIM_EXTEND4_START)):
        with Locations((0, 165.1)):
            Rectangle(TRIM_EXTEND4_OUTLINE_W, TRIM_EXTEND4_OUTLINE_H)
        with Locations((0, 165.1)):
            Rectangle(TRIM_EXTEND4_OUTLINE_W_2, TRIM_EXTEND4_OUTLINE_H_2, mode=Mode.SUBTRACT)
    # profile 2 of 2: a face of its own
    with BuildSketch(Plane.YZ.offset(TRIM_EXTEND4_START)):
        with Locations((0, -165.1)):
            Rectangle(TRIM_EXTEND4_OUTLINE_W, TRIM_EXTEND4_OUTLINE_H)
        with Locations((0, -165.1)):
            Rectangle(TRIM_EXTEND4_OUTLINE_W_2, TRIM_EXTEND4_OUTLINE_H_2, mode=Mode.SUBTRACT)
    extrude(amount=TRIM_EXTEND4_DEPTH)


with BuildPart() as body_6_1:
    add(body_6.part)

    # Trim/Extend3: cut back where it meets the other member's skin (coped)
    split(bisect_by=body_10.part.faces().sort_by_distance((-228.6, -119.0625, 7.9375))[0], keep=Keep.TOP)


with BuildPart() as body_7_1:
    add(body_7.part)

    # Trim/Extend3: cut back where it meets the other member's skin (coped)
    split(bisect_by=body_10.part.faces().sort_by_distance((-228.6, -119.0625, 7.9375))[0], keep=Keep.TOP)


solid = Compound([part.part, body_4.part, body_5.part, body_8.part, body_9.part, body_10.part, body_2_1.part, body_6_1.part, body_7_1.part])
